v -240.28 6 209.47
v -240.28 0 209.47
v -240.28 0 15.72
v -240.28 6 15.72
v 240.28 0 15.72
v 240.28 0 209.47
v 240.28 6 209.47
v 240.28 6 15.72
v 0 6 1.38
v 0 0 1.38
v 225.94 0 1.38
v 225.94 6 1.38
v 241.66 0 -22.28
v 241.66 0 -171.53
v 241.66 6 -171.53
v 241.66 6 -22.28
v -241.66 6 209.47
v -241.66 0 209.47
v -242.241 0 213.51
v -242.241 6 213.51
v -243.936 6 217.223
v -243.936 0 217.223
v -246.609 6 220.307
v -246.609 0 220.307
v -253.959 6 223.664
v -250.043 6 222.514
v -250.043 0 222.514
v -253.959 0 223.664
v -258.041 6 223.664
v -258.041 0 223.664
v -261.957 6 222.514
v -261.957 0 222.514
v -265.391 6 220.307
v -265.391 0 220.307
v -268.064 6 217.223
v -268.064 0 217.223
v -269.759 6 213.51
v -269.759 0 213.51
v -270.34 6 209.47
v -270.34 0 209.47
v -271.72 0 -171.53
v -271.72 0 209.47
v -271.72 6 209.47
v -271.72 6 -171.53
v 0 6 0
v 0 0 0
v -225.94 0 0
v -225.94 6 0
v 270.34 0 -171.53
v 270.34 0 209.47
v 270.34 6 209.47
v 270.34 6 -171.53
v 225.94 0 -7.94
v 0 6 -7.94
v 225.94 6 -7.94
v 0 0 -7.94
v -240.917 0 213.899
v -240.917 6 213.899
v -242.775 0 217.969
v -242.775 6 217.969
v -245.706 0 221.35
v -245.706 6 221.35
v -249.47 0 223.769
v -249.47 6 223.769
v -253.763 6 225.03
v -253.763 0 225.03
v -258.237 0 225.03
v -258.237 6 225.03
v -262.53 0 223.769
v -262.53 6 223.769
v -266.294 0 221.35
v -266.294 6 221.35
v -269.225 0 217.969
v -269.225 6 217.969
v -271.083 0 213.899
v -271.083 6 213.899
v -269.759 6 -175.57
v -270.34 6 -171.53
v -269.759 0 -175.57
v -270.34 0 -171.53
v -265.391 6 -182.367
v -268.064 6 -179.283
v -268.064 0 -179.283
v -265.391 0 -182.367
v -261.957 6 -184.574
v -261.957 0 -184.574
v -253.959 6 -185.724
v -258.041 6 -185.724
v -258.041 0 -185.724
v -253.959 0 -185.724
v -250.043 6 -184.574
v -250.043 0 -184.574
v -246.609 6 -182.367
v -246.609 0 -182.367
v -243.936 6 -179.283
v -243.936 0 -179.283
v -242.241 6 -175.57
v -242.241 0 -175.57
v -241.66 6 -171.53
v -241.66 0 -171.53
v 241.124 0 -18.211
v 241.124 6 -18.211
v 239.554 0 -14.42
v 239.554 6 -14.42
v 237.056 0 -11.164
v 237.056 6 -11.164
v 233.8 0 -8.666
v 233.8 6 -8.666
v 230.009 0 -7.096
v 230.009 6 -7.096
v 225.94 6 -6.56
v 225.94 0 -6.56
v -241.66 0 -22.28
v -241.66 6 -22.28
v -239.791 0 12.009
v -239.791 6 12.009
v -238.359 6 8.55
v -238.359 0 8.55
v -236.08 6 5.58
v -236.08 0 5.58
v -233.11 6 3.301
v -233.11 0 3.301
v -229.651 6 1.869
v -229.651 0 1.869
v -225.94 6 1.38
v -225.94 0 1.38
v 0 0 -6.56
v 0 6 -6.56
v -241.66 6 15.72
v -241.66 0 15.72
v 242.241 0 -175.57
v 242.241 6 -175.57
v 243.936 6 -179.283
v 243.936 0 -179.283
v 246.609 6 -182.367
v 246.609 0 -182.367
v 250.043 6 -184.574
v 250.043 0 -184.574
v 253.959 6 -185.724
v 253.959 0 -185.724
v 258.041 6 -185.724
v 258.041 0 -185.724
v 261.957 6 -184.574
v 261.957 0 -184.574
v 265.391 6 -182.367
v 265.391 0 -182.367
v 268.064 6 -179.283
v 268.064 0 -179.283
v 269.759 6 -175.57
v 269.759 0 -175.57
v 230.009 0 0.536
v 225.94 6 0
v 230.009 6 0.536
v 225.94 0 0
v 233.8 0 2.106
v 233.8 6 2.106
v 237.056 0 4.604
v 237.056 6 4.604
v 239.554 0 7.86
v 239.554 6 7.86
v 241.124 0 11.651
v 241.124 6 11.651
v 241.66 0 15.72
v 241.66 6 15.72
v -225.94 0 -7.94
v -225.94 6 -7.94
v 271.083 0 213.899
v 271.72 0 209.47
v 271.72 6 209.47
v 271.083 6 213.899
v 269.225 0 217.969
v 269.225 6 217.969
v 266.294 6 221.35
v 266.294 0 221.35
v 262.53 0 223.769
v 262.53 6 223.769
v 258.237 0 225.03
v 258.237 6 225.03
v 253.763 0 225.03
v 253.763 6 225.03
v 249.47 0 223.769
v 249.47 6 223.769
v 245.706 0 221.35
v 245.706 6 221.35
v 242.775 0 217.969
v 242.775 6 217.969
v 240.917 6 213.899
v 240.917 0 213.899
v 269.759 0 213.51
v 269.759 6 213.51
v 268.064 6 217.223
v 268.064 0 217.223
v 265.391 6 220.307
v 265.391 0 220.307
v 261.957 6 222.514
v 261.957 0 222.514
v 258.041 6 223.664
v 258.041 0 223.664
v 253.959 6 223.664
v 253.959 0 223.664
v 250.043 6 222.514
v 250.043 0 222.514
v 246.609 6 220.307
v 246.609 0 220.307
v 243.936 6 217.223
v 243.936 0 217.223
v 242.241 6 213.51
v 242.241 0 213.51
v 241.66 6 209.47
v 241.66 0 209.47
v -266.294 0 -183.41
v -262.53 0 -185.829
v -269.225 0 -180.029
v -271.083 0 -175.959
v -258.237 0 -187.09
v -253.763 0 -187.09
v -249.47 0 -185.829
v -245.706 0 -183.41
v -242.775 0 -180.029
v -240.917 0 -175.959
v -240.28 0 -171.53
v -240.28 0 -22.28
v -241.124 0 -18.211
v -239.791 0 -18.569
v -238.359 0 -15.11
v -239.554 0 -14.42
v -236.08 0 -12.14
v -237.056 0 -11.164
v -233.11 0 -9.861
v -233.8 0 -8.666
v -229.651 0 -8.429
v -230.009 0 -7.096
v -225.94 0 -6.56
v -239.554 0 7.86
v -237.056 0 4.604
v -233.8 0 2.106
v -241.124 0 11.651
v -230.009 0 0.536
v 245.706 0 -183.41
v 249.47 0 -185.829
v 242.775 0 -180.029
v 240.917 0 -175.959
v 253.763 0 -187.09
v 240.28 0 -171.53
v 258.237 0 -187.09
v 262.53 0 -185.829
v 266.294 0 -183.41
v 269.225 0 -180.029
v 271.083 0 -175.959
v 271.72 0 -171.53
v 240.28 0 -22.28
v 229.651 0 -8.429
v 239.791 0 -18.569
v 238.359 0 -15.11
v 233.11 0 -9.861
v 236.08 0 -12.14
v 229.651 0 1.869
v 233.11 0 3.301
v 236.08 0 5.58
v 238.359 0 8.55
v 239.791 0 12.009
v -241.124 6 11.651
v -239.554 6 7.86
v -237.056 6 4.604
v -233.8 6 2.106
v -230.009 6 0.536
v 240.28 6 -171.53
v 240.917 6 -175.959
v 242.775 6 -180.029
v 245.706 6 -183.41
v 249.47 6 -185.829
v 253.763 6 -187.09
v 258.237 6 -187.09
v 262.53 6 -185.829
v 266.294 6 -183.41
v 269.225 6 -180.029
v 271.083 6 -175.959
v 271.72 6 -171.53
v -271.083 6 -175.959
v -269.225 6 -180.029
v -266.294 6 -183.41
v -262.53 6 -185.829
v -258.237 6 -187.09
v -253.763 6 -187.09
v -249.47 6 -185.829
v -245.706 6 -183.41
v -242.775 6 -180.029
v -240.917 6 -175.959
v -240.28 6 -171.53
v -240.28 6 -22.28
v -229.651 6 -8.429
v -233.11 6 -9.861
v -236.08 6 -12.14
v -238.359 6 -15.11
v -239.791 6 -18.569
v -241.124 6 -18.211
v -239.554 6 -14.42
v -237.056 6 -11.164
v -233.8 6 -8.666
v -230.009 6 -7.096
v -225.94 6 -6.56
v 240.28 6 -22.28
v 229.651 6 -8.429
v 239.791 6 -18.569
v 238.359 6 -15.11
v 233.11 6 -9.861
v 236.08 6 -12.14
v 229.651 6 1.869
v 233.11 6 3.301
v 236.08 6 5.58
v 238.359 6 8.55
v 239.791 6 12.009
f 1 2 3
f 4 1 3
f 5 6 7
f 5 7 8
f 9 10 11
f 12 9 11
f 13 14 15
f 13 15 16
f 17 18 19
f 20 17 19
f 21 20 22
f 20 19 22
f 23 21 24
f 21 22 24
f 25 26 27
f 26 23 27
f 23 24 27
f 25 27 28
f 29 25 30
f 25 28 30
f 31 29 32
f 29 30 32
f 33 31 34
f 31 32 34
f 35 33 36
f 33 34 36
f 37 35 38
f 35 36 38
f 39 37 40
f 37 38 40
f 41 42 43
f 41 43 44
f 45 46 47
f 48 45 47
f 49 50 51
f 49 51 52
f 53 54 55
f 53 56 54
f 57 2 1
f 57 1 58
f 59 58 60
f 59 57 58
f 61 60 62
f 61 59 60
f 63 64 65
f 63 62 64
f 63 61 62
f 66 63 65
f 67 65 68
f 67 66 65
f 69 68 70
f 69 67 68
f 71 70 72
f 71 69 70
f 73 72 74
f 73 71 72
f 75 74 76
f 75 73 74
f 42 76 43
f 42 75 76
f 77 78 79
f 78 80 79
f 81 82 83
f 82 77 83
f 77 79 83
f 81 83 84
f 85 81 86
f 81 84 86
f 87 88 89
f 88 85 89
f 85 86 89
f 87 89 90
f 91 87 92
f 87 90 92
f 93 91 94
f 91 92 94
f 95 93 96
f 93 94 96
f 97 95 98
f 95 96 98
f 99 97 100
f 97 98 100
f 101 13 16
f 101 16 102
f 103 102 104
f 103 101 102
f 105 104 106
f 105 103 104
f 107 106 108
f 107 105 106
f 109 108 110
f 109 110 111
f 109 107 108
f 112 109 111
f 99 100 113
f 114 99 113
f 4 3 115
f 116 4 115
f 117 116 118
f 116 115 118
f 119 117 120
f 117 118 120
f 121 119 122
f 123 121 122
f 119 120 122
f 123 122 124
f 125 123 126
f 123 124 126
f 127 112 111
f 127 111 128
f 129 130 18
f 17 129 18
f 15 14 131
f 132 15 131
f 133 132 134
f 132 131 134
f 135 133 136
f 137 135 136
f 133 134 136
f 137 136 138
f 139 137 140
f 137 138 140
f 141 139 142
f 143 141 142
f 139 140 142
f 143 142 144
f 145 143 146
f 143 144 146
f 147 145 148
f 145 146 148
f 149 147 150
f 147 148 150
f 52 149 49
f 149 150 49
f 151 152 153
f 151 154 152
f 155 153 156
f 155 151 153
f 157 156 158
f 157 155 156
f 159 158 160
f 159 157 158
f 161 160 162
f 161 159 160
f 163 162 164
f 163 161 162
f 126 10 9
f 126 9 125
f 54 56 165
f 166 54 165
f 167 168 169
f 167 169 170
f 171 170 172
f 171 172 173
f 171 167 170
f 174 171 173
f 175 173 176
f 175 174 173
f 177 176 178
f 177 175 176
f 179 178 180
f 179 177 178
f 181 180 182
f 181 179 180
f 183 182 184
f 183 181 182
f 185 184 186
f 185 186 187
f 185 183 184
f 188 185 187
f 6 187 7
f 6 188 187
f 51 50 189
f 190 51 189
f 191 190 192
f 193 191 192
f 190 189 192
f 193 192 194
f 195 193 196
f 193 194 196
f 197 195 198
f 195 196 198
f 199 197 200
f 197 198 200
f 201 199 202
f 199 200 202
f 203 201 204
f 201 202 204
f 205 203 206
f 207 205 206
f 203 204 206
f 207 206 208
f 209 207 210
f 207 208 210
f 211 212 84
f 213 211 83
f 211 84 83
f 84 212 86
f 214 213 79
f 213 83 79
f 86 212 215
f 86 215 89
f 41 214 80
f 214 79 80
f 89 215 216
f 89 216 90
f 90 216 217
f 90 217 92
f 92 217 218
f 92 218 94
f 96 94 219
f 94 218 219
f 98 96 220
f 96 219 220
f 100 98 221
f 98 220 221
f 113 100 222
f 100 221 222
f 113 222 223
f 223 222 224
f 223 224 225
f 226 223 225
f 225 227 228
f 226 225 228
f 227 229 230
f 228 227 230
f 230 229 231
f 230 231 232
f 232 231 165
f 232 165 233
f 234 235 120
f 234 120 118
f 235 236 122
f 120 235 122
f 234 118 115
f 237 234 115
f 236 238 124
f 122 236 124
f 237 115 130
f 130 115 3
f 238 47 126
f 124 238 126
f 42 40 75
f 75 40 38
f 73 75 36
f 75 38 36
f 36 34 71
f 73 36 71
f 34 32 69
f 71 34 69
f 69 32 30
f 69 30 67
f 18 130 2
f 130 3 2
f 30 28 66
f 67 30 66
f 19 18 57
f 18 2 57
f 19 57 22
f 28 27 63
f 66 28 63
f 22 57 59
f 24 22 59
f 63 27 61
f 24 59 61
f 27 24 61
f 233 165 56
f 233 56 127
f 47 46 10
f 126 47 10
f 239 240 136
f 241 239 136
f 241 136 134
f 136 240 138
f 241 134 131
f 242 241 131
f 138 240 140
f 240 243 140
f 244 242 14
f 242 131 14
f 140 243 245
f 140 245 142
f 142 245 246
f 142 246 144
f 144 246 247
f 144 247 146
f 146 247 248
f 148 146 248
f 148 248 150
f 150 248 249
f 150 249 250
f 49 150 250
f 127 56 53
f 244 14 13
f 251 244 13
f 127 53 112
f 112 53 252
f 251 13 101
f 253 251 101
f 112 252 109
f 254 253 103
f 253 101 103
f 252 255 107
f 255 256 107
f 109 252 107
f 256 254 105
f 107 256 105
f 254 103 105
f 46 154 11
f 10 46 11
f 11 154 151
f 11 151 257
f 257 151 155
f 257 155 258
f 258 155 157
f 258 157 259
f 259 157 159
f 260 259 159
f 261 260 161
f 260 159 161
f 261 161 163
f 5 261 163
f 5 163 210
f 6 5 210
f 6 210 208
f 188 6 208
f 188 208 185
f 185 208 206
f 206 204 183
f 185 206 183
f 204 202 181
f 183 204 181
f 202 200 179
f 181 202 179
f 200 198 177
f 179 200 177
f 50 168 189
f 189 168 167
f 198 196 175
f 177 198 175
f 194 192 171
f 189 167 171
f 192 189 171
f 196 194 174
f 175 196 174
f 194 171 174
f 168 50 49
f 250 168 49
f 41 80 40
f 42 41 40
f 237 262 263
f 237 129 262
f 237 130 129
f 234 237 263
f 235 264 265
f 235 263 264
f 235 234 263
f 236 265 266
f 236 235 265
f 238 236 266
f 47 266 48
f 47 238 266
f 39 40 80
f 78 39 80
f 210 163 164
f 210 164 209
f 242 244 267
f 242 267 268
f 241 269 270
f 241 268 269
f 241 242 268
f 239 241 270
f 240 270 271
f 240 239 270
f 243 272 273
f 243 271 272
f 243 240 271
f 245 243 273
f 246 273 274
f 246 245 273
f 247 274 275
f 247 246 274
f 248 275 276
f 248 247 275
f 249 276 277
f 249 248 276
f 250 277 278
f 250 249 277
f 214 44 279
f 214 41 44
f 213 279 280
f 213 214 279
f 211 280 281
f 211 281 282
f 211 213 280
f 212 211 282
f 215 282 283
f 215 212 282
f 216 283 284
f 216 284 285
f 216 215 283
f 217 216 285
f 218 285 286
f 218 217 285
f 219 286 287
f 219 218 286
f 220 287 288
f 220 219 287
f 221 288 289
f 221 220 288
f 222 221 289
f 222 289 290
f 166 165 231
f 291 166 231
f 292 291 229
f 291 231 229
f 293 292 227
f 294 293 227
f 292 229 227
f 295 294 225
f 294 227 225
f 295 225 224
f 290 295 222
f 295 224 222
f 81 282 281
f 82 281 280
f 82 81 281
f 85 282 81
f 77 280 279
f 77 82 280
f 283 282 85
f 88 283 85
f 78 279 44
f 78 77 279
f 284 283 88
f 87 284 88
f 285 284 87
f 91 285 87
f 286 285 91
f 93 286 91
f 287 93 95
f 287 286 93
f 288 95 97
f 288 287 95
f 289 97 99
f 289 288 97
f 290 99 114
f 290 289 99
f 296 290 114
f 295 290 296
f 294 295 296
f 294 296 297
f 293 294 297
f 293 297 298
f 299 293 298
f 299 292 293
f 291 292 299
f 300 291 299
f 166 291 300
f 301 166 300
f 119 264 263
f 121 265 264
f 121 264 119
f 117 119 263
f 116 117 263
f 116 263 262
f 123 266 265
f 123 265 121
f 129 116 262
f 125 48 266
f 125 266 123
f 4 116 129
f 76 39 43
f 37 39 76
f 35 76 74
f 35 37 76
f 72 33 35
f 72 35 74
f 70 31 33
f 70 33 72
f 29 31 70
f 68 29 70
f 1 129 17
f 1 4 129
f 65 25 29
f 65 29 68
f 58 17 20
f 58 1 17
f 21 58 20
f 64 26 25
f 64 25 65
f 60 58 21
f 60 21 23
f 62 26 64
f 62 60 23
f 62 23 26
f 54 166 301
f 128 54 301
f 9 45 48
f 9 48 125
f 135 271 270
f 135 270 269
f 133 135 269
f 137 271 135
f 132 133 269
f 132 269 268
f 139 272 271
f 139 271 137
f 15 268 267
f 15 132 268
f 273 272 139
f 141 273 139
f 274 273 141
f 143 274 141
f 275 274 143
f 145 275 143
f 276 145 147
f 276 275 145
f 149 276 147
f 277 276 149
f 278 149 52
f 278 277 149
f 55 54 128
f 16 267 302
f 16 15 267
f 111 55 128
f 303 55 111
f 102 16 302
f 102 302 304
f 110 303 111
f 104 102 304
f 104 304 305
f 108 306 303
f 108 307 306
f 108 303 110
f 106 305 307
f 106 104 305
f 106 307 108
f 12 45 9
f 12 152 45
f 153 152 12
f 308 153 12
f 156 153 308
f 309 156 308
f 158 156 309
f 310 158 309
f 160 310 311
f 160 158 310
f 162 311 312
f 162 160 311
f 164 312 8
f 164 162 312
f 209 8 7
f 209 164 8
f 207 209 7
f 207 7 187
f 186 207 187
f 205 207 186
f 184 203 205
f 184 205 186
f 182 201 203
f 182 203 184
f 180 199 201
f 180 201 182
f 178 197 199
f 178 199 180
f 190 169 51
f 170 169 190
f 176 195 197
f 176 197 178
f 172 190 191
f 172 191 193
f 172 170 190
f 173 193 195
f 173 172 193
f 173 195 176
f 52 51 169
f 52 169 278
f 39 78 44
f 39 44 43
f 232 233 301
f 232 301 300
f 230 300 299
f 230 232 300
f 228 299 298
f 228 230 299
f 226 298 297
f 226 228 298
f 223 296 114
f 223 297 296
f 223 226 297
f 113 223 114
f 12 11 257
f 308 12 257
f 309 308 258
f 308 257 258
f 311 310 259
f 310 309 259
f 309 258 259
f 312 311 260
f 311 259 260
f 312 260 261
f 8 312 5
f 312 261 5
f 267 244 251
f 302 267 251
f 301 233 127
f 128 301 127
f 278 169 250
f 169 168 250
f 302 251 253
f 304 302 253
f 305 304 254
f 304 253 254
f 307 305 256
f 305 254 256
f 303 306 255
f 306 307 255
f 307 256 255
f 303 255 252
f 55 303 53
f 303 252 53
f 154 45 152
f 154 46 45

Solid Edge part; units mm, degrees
sketch "Sketch1" plane through (0, 0, 0) normal (0, -1, 0) x (1, 0, 0)
  line L0 (-241.66, 15.72) -> (-241.66, 209.47)
  arc A0 (-270.34, 209.47) -> (-241.66, 209.47) centre (-256, 209.47) cw
  line L1 (-270.34, 209.47) -> (-270.34, -171.53)
  arc A1 (-241.66, -171.53) -> (-270.34, -171.53) centre (-256, -171.53) cw
  line L2 (-241.66, -171.53) -> (-241.66, -22.28)
  arc A2 (-241.66, -22.28) -> (-225.94, -6.56) centre (-225.94, -22.28) cw
  line L3 (-225.94, -6.56) -> (0, -6.56)
  line L4 (225.94, -6.56) -> (0, -6.56)
  arc A3 (241.66, -22.28) -> (225.94, -6.56) centre (225.94, -22.28) ccw
  line L5 (241.66, -171.53) -> (241.66, -22.28)
  arc A4 (241.66, -171.53) -> (270.34, -171.53) centre (256, -171.53) ccw
  line L6 (270.34, 209.47) -> (270.34, -171.53)
  arc A5 (270.34, 209.47) -> (241.66, 209.47) centre (256, 209.47) ccw
  line L7 (241.66, 15.72) -> (241.66, 209.47)
  arc A6 (225.94, 0) -> (241.66, 15.72) centre (225.94, 15.72) ccw
  line L8 (0, 0) -> (225.94, 0)
  line L9 (0, 0) -> (-225.94, 0)
  arc A7 (-225.94, 0) -> (-241.66, 15.72) centre (-225.94, 15.72) cw
  line L10 (0, -7.94) -> (-225.94, -7.94)
  arc A8 (-225.94, -7.94) -> (-240.28, -22.28) centre (-225.94, -22.28) ccw
  line L11 (-240.28, -171.53) -> (-240.28, -22.28)
  arc A9 (-271.72, -171.53) -> (-240.28, -171.53) centre (-256, -171.53) ccw
  line L12 (-271.72, 209.47) -> (-271.72, -171.53)
  arc A10 (-271.72, 209.47) -> (-240.28, 209.47) centre (-256, 209.47) cw
  line L13 (-240.28, 209.47) -> (-240.28, 15.72)
  arc A11 (-240.28, 15.72) -> (-225.94, 1.38) centre (-225.94, 15.72) ccw
  line L14 (0, 1.38) -> (-225.94, 1.38)
  line L15 (0, 1.38) -> (225.94, 1.38)
  arc A12 (240.28, 15.72) -> (225.94, 1.38) centre (225.94, 15.72) cw
  line L16 (240.28, 209.47) -> (240.28, 15.72)
  arc A13 (271.72, 209.47) -> (240.28, 209.47) centre (256, 209.47) ccw
  line L17 (271.72, 209.47) -> (271.72, -171.53)
  arc A14 (271.72, -171.53) -> (240.28, -171.53) centre (256, -171.53) cw
  line L18 (240.28, -171.53) -> (240.28, -22.28)
  arc A15 (225.94, -7.94) -> (240.28, -22.28) centre (225.94, -22.28) cw
  line L19 (0, -7.94) -> (225.94, -7.94)
  dimension "D1" = 14.34
  dimension "D2" = 381
  dimension "D3" = 1.38
  dimension "D4" = 1.38
  dimension "D5" = 14.34
  dimension "D6" = 1.38
  dimension "D7" = 1.38
  dimension "D8" = 1.38
  dimension "D9" = 14.34
  dimension "D10" = 225.94
  dimension "D11" = 193.75
  dimension "D12" = 149.25
extrude "Protrusion1" add sketch "Sketch1" against normal blind 6
